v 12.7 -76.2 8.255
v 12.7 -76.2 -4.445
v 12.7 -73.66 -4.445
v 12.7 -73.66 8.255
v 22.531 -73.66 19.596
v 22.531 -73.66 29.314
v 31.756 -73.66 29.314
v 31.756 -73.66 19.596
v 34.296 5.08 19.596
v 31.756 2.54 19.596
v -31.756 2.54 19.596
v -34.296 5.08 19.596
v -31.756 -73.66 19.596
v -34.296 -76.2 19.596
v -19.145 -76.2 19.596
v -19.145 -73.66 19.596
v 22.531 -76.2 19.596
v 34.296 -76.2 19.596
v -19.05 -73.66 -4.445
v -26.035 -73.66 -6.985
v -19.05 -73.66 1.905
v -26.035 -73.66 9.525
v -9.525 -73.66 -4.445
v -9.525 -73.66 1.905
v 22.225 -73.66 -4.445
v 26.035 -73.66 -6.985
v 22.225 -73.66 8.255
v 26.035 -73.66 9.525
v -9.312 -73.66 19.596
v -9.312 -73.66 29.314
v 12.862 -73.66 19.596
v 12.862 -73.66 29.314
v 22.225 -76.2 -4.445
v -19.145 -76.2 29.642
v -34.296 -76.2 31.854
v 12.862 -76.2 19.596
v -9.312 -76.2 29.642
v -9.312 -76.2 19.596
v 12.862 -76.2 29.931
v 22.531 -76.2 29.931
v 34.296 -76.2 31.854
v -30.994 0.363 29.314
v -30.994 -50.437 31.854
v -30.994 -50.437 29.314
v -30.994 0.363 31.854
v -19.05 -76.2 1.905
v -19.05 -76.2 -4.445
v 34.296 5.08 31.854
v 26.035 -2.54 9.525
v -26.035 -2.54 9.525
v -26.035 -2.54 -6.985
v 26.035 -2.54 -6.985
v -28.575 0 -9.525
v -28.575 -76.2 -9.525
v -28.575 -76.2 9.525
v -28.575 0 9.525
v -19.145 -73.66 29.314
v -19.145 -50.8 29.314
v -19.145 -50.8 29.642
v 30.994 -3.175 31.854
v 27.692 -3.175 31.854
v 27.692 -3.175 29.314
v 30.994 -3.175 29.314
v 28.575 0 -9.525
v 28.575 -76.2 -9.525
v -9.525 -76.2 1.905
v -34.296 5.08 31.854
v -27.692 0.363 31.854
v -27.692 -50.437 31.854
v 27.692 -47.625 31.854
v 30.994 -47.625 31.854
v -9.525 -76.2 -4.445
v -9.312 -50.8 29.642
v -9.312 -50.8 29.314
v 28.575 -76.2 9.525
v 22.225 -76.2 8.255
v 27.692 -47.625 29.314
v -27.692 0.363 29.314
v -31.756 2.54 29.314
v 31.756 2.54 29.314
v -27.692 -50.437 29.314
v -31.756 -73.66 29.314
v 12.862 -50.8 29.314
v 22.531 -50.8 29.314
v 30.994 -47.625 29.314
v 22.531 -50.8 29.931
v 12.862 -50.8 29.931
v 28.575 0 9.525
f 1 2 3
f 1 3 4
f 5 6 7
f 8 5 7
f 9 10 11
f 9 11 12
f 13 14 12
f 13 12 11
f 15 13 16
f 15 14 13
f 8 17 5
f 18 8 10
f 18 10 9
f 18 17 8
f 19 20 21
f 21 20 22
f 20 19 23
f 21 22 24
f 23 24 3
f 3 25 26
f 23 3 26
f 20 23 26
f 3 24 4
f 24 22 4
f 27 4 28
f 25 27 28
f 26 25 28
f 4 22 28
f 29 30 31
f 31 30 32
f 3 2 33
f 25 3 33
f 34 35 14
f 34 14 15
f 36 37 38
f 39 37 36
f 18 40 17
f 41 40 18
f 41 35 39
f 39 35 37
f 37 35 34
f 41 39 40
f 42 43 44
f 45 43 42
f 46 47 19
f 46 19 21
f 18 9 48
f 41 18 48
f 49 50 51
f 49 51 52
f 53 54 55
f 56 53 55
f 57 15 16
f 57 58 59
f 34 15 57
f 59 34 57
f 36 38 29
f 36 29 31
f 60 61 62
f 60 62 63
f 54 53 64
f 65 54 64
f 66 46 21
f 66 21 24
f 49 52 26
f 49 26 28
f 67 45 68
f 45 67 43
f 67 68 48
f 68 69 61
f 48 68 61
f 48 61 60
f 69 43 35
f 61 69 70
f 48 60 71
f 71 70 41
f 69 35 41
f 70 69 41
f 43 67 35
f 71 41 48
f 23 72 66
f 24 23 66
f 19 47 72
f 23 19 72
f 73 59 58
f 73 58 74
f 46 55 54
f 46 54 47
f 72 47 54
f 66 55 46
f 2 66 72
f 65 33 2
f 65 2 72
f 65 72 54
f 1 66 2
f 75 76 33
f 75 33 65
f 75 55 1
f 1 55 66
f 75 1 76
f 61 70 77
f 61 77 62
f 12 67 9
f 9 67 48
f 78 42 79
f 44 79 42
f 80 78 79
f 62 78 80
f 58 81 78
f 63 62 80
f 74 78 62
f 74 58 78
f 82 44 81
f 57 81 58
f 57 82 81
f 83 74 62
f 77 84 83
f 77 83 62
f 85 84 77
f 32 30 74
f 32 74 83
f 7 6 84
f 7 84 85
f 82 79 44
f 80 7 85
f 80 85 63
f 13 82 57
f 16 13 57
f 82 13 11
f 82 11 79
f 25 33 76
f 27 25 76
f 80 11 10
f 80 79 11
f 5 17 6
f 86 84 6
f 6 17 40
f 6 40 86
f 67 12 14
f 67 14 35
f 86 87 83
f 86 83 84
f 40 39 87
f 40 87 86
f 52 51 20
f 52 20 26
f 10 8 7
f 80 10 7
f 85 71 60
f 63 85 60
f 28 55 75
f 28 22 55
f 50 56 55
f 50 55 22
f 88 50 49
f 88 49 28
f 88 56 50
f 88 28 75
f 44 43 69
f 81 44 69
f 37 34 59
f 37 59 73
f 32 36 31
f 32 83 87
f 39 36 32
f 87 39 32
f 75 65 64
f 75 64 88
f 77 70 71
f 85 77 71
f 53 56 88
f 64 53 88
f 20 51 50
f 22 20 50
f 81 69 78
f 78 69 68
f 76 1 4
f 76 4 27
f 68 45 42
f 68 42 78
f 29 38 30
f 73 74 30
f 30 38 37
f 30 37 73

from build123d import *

# Parameters (mm, degrees)
F0_W      = 57.15
F0_H      = 19.05
F1_DEPTH  = 76.2
F2_T      = -2.54
F3_W      = 9.525
F3_H      = 6.35
F4_DEPTH  = 25.4
F5_W      = 9.525
F5_H      = 12.7
F6_DEPTH  = 25.4
F8_W      = 68.5918703675
F8_H      = 12.2578628361
F9_DEPTH  = 81.28
F10_T     = -2.54
F11_W     = 9.833057411
F11_H     = 10.0466273725
F11_W_2   = 9.6692787483
F11_H_2   = 10.3357378393
F12_DEPTH = 25.4
F13_W     = 3.302
F13_H     = 50.8
F14_DEPTH = 25.4
F15_W     = 3.302
F15_H     = 44.45
F16_DEPTH = 25.4


with BuildPart() as f1:
    # F0 (on Front) → F1 (new body)
    with BuildSketch(Plane.XZ):
        Rectangle(F0_W, F0_H)
    extrude(amount=F1_DEPTH)

    # F2
    f2_openings = [f1.faces().sort_by_distance(p)[0] for p in [
        (0, -38.1, 9.525),
    ]]
    offset(amount=F2_T, openings=f2_openings)

    # F3 (on face) → F4 (cut)
    with BuildSketch(Plane.XZ.offset(76.2)):
        with Locations((-14.2875, -1.27)):
            Rectangle(F3_W, F3_H)
    extrude(amount=-F4_DEPTH, mode=Mode.SUBTRACT)

    # F5 (on face) → F6 (cut)
    with BuildSketch(Plane.XZ.offset(76.2)):
        with Locations((17.4625, 1.905)):
            Rectangle(F5_W, F5_H)
    extrude(amount=-F6_DEPTH, mode=Mode.SUBTRACT)


with BuildPart() as f9:
    # F8 (on face) → F9 (new body)
    with BuildSketch(Plane.XZ.offset(76.2)):
        with Locations((0, 25.7245693356)):
            Rectangle(F8_W, F8_H)
    extrude(amount=-F9_DEPTH)

    # F10
    f10_openings = [f9.faces().sort_by_distance(p)[0] for p in [
        (0, -35.56, 19.595638),
    ]]
    offset(amount=F10_T, openings=f10_openings)

    # F11 (on face) → F12 (cut)
    with BuildSketch(Plane.XZ.offset(76.2)):
        with Locations((-14.2288259231, 24.6189516038)):
            Rectangle(F11_W, F11_H)
        with Locations((17.6961715333, 24.7635068372)):
            Rectangle(F11_W_2, F11_H_2)
    extrude(amount=-F12_DEPTH, mode=Mode.SUBTRACT)

    # F13 (on face) → F14 (cut)
    with BuildSketch(Plane.XY.offset(31.8535007536)):
        with Locations((-29.3429351838, -25.0374122988)):
            Rectangle(F13_W, F13_H)
    extrude(amount=-F14_DEPTH, mode=Mode.SUBTRACT)

    # F15 (on face) → F16 (cut)
    with BuildSketch(Plane.XY.offset(31.8535007536)):
        with Locations((29.3429351838, -25.4)):
            Rectangle(F15_W, F15_H)
    extrude(amount=-F16_DEPTH, mode=Mode.SUBTRACT)


solid = Compound([f1.part, f9.part])
